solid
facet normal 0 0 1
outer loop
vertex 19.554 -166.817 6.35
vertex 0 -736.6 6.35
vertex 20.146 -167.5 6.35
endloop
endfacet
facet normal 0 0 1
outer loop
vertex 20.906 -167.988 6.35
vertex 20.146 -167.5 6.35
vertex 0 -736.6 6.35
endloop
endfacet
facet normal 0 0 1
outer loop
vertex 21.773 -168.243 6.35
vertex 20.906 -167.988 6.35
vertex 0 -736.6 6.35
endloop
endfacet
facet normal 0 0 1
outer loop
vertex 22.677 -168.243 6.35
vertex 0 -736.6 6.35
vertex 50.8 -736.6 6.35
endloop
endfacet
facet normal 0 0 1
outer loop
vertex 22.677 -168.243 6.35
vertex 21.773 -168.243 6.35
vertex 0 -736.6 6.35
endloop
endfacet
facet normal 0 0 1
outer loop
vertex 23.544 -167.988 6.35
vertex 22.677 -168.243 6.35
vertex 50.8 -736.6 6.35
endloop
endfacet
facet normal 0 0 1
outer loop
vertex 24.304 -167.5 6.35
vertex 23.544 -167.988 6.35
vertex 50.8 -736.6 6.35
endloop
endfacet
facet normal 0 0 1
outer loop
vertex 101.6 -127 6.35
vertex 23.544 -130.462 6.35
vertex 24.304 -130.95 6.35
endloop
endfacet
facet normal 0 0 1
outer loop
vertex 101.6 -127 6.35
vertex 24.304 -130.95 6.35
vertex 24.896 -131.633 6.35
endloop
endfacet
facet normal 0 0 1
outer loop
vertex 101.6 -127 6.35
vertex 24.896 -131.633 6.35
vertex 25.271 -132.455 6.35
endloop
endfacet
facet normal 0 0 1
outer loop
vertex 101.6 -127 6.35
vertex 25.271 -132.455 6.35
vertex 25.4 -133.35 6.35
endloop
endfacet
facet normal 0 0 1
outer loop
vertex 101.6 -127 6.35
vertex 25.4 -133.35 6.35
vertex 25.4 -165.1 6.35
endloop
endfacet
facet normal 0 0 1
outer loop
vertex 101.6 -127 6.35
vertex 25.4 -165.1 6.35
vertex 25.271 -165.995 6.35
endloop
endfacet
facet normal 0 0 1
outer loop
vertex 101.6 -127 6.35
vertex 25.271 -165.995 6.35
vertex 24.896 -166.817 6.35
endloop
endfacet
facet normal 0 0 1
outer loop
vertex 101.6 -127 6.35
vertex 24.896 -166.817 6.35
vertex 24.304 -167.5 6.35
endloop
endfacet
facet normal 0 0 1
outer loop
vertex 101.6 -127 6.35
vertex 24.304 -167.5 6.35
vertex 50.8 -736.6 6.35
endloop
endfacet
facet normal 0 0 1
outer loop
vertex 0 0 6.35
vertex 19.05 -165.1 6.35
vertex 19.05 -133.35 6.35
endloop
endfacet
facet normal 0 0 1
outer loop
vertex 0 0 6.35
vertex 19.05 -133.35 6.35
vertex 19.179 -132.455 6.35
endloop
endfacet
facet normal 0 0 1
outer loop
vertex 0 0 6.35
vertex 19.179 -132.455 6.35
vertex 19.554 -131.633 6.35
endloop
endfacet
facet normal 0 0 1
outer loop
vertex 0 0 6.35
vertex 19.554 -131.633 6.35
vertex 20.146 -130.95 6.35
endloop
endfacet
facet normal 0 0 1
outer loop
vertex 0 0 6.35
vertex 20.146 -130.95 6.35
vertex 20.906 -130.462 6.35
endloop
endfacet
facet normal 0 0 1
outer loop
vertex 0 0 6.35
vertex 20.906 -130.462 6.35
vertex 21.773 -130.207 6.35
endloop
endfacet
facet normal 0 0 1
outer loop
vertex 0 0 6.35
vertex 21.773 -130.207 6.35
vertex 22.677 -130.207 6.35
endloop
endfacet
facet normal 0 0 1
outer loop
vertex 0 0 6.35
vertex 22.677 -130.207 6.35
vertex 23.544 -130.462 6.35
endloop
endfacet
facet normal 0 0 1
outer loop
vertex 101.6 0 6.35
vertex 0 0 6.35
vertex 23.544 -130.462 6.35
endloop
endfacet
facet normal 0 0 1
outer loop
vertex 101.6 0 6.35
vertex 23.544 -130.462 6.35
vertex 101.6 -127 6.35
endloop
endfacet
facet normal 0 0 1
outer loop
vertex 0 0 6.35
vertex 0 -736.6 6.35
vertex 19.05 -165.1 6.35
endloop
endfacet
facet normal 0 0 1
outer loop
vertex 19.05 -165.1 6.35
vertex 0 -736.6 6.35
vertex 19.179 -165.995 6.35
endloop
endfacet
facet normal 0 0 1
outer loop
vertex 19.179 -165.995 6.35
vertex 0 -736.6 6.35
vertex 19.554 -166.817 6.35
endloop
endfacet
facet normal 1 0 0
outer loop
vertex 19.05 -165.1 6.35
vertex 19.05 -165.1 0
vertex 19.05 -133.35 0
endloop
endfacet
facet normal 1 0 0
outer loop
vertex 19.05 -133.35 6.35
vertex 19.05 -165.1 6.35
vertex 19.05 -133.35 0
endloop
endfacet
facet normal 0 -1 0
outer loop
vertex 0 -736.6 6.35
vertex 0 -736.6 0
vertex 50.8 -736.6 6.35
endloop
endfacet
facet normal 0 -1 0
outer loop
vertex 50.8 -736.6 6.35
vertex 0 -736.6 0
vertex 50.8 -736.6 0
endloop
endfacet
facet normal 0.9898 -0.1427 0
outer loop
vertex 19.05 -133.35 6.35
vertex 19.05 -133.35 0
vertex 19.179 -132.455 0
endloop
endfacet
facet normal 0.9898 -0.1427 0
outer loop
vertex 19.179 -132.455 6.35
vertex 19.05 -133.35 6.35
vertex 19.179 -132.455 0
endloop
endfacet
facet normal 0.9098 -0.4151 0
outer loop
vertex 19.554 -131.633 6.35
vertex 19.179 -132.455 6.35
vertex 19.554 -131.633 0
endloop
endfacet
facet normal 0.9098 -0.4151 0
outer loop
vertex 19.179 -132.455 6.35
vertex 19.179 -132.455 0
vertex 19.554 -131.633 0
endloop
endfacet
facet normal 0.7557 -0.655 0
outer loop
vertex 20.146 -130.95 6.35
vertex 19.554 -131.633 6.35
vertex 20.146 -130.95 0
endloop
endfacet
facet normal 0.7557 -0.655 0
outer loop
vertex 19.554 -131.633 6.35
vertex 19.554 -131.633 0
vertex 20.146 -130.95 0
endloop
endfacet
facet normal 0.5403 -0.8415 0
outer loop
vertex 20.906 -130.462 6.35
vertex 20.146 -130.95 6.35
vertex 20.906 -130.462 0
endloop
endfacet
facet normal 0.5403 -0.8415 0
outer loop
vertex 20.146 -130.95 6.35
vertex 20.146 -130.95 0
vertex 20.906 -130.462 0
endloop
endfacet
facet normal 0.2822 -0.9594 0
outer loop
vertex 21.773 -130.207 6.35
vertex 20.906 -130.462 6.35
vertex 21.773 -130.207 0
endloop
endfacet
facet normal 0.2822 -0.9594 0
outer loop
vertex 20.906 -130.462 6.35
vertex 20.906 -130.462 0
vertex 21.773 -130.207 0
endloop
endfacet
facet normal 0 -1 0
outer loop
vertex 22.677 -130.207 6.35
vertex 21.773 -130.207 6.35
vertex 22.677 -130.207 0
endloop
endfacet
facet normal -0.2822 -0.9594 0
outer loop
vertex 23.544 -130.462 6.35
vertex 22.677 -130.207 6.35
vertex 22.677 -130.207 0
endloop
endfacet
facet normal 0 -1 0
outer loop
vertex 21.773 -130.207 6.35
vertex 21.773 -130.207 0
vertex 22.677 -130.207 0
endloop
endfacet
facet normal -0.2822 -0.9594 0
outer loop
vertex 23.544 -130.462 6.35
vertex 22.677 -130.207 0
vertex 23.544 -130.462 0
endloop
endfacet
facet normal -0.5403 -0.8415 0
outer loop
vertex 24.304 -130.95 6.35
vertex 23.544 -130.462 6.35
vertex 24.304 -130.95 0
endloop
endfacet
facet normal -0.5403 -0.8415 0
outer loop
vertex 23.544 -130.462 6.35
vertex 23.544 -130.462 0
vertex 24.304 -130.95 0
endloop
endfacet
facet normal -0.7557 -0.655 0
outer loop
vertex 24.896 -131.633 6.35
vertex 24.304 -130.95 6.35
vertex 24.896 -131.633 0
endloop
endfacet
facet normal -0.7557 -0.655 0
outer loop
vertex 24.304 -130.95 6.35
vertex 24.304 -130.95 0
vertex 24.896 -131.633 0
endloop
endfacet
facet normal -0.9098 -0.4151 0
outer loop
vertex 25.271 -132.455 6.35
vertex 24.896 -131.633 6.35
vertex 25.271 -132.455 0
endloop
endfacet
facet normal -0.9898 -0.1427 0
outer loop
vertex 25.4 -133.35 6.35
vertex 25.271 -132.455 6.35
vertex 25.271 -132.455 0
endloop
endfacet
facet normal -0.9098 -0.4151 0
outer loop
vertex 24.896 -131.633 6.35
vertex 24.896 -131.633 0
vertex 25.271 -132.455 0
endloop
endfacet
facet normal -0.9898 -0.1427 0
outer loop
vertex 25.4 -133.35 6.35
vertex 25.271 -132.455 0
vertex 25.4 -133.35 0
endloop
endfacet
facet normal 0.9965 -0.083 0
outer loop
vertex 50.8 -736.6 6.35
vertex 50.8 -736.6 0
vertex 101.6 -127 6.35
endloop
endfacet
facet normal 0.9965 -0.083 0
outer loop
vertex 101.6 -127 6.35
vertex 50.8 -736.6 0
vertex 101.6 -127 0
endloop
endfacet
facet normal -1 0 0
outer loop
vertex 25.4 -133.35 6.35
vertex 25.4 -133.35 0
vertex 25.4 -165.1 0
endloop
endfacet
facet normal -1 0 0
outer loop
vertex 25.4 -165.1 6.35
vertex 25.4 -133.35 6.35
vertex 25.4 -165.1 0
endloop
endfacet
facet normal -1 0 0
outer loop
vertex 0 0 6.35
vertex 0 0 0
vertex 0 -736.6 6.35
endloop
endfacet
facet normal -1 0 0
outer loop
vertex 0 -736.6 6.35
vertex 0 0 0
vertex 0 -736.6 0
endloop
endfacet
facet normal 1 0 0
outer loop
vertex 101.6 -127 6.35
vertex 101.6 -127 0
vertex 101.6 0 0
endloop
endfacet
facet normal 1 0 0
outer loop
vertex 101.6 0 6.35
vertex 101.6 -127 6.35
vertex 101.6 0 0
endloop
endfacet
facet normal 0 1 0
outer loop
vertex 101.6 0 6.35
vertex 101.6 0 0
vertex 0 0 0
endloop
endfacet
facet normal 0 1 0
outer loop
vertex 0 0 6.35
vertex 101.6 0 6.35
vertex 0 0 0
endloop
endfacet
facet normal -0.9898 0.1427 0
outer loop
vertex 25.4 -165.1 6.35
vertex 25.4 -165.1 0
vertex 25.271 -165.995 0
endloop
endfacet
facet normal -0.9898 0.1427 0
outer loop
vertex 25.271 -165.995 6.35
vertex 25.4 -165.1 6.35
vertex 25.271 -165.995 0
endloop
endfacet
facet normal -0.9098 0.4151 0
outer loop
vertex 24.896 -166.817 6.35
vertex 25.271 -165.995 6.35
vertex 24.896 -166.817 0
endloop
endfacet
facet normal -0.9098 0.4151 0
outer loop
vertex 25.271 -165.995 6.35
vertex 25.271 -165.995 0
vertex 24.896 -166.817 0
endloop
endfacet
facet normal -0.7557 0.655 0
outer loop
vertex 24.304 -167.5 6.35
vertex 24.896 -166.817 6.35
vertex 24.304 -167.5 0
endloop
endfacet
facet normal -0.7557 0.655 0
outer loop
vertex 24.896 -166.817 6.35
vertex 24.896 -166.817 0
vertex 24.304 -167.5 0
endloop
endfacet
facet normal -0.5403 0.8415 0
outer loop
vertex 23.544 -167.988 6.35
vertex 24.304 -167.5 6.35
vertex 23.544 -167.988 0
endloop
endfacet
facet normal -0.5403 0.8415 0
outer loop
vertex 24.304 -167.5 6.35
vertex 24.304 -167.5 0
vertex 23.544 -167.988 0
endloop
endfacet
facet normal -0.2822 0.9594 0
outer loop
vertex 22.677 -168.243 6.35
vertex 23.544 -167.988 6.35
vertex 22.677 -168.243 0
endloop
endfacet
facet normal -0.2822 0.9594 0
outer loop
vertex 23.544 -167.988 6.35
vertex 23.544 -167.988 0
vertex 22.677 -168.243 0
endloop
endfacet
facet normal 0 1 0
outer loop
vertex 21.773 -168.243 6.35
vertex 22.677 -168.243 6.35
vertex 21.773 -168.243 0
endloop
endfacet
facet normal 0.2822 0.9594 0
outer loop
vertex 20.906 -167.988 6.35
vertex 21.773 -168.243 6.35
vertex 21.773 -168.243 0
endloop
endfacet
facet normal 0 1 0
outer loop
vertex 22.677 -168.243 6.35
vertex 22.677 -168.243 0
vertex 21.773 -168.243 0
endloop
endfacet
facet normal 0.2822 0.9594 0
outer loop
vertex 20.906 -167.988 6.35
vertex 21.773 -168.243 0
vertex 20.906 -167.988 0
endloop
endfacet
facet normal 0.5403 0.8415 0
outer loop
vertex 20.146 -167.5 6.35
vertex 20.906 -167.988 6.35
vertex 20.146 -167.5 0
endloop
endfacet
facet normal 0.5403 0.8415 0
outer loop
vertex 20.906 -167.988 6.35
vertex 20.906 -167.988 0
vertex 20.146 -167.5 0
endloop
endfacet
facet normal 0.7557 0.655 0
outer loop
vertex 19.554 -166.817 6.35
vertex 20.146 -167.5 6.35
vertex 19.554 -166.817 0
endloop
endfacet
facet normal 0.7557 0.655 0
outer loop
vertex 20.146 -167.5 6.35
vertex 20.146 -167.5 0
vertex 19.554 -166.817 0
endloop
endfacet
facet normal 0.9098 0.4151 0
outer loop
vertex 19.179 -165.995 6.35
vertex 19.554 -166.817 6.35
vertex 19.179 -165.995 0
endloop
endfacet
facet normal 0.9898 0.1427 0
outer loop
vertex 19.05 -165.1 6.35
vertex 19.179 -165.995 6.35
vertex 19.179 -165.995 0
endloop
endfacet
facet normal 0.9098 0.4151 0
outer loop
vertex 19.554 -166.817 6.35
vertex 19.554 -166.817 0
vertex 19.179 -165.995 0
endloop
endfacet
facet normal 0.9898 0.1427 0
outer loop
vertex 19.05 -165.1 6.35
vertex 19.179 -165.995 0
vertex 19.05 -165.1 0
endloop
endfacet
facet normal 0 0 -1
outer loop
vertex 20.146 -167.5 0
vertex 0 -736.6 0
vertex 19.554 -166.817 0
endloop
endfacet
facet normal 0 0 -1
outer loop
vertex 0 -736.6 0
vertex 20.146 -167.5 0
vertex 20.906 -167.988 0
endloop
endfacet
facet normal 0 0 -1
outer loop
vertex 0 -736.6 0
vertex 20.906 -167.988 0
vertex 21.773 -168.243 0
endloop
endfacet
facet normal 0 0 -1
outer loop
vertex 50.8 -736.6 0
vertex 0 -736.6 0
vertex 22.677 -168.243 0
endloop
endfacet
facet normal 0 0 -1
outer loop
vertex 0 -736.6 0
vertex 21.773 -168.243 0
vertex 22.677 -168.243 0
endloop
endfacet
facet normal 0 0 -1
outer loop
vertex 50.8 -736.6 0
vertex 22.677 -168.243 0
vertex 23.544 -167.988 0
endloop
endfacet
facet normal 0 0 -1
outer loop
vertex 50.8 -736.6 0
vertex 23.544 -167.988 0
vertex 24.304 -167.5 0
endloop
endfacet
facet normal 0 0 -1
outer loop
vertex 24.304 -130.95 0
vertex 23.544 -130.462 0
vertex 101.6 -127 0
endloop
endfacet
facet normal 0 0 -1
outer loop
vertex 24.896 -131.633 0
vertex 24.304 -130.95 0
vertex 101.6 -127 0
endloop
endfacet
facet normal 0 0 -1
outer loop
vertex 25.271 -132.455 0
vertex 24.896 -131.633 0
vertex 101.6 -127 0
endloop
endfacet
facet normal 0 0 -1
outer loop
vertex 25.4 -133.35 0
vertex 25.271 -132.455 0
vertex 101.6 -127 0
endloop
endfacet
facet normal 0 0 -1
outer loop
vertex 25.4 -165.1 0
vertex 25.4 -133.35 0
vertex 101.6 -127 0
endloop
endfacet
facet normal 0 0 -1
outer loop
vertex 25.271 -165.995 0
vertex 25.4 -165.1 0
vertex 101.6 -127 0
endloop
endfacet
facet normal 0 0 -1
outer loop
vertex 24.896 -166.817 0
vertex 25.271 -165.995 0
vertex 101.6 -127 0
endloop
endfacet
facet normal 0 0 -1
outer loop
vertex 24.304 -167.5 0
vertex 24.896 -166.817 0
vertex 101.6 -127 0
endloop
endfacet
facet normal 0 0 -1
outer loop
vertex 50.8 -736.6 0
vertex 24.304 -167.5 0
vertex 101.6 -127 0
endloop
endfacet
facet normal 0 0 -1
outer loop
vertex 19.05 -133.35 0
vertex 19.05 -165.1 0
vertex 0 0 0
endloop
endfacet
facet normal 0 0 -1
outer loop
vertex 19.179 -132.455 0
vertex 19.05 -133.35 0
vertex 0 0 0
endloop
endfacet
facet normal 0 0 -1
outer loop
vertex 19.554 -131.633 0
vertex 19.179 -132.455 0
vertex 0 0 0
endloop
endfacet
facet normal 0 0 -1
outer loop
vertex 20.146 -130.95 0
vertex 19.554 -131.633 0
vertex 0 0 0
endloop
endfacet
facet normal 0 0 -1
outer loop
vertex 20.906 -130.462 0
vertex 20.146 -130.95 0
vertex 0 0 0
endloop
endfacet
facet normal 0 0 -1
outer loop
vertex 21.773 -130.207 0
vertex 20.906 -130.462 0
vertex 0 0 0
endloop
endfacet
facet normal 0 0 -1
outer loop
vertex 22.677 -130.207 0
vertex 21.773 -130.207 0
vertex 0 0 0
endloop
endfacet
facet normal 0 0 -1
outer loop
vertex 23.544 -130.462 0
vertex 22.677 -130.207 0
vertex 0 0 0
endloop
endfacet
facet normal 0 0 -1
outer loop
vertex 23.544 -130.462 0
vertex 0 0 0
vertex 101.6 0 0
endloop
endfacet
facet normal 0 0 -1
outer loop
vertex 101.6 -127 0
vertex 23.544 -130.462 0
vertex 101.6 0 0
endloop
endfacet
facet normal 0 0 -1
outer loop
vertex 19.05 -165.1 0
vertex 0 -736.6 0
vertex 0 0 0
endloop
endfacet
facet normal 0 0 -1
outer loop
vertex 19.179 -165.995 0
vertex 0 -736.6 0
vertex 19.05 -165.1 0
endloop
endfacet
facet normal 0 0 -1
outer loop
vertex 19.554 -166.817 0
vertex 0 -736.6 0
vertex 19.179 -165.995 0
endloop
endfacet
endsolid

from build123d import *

# Parameters (mm, degrees)
F1_DEPTH = 6.35


with BuildPart() as f1:
    # F0 (on Top) → F1 (new body)
    with BuildSketch(Plane.XY):
        Polygon((101.6, 0), (0, 0), (0, -736.6), (50.8, -736.6), (101.6, -127), align=None)
        with BuildLine():
            ThreePointArc((19.05, -133.35), (22.225, -130.175), (25.4, -133.35))
            Line((25.4, -133.35), (25.4, -165.1))
            ThreePointArc((25.4, -165.1), (22.225, -168.275), (19.05, -165.1))
            Line((19.05, -165.1), (19.05, -133.35))
        make_face(mode=Mode.SUBTRACT)
    extrude(amount=F1_DEPTH)


solid = f1.part
